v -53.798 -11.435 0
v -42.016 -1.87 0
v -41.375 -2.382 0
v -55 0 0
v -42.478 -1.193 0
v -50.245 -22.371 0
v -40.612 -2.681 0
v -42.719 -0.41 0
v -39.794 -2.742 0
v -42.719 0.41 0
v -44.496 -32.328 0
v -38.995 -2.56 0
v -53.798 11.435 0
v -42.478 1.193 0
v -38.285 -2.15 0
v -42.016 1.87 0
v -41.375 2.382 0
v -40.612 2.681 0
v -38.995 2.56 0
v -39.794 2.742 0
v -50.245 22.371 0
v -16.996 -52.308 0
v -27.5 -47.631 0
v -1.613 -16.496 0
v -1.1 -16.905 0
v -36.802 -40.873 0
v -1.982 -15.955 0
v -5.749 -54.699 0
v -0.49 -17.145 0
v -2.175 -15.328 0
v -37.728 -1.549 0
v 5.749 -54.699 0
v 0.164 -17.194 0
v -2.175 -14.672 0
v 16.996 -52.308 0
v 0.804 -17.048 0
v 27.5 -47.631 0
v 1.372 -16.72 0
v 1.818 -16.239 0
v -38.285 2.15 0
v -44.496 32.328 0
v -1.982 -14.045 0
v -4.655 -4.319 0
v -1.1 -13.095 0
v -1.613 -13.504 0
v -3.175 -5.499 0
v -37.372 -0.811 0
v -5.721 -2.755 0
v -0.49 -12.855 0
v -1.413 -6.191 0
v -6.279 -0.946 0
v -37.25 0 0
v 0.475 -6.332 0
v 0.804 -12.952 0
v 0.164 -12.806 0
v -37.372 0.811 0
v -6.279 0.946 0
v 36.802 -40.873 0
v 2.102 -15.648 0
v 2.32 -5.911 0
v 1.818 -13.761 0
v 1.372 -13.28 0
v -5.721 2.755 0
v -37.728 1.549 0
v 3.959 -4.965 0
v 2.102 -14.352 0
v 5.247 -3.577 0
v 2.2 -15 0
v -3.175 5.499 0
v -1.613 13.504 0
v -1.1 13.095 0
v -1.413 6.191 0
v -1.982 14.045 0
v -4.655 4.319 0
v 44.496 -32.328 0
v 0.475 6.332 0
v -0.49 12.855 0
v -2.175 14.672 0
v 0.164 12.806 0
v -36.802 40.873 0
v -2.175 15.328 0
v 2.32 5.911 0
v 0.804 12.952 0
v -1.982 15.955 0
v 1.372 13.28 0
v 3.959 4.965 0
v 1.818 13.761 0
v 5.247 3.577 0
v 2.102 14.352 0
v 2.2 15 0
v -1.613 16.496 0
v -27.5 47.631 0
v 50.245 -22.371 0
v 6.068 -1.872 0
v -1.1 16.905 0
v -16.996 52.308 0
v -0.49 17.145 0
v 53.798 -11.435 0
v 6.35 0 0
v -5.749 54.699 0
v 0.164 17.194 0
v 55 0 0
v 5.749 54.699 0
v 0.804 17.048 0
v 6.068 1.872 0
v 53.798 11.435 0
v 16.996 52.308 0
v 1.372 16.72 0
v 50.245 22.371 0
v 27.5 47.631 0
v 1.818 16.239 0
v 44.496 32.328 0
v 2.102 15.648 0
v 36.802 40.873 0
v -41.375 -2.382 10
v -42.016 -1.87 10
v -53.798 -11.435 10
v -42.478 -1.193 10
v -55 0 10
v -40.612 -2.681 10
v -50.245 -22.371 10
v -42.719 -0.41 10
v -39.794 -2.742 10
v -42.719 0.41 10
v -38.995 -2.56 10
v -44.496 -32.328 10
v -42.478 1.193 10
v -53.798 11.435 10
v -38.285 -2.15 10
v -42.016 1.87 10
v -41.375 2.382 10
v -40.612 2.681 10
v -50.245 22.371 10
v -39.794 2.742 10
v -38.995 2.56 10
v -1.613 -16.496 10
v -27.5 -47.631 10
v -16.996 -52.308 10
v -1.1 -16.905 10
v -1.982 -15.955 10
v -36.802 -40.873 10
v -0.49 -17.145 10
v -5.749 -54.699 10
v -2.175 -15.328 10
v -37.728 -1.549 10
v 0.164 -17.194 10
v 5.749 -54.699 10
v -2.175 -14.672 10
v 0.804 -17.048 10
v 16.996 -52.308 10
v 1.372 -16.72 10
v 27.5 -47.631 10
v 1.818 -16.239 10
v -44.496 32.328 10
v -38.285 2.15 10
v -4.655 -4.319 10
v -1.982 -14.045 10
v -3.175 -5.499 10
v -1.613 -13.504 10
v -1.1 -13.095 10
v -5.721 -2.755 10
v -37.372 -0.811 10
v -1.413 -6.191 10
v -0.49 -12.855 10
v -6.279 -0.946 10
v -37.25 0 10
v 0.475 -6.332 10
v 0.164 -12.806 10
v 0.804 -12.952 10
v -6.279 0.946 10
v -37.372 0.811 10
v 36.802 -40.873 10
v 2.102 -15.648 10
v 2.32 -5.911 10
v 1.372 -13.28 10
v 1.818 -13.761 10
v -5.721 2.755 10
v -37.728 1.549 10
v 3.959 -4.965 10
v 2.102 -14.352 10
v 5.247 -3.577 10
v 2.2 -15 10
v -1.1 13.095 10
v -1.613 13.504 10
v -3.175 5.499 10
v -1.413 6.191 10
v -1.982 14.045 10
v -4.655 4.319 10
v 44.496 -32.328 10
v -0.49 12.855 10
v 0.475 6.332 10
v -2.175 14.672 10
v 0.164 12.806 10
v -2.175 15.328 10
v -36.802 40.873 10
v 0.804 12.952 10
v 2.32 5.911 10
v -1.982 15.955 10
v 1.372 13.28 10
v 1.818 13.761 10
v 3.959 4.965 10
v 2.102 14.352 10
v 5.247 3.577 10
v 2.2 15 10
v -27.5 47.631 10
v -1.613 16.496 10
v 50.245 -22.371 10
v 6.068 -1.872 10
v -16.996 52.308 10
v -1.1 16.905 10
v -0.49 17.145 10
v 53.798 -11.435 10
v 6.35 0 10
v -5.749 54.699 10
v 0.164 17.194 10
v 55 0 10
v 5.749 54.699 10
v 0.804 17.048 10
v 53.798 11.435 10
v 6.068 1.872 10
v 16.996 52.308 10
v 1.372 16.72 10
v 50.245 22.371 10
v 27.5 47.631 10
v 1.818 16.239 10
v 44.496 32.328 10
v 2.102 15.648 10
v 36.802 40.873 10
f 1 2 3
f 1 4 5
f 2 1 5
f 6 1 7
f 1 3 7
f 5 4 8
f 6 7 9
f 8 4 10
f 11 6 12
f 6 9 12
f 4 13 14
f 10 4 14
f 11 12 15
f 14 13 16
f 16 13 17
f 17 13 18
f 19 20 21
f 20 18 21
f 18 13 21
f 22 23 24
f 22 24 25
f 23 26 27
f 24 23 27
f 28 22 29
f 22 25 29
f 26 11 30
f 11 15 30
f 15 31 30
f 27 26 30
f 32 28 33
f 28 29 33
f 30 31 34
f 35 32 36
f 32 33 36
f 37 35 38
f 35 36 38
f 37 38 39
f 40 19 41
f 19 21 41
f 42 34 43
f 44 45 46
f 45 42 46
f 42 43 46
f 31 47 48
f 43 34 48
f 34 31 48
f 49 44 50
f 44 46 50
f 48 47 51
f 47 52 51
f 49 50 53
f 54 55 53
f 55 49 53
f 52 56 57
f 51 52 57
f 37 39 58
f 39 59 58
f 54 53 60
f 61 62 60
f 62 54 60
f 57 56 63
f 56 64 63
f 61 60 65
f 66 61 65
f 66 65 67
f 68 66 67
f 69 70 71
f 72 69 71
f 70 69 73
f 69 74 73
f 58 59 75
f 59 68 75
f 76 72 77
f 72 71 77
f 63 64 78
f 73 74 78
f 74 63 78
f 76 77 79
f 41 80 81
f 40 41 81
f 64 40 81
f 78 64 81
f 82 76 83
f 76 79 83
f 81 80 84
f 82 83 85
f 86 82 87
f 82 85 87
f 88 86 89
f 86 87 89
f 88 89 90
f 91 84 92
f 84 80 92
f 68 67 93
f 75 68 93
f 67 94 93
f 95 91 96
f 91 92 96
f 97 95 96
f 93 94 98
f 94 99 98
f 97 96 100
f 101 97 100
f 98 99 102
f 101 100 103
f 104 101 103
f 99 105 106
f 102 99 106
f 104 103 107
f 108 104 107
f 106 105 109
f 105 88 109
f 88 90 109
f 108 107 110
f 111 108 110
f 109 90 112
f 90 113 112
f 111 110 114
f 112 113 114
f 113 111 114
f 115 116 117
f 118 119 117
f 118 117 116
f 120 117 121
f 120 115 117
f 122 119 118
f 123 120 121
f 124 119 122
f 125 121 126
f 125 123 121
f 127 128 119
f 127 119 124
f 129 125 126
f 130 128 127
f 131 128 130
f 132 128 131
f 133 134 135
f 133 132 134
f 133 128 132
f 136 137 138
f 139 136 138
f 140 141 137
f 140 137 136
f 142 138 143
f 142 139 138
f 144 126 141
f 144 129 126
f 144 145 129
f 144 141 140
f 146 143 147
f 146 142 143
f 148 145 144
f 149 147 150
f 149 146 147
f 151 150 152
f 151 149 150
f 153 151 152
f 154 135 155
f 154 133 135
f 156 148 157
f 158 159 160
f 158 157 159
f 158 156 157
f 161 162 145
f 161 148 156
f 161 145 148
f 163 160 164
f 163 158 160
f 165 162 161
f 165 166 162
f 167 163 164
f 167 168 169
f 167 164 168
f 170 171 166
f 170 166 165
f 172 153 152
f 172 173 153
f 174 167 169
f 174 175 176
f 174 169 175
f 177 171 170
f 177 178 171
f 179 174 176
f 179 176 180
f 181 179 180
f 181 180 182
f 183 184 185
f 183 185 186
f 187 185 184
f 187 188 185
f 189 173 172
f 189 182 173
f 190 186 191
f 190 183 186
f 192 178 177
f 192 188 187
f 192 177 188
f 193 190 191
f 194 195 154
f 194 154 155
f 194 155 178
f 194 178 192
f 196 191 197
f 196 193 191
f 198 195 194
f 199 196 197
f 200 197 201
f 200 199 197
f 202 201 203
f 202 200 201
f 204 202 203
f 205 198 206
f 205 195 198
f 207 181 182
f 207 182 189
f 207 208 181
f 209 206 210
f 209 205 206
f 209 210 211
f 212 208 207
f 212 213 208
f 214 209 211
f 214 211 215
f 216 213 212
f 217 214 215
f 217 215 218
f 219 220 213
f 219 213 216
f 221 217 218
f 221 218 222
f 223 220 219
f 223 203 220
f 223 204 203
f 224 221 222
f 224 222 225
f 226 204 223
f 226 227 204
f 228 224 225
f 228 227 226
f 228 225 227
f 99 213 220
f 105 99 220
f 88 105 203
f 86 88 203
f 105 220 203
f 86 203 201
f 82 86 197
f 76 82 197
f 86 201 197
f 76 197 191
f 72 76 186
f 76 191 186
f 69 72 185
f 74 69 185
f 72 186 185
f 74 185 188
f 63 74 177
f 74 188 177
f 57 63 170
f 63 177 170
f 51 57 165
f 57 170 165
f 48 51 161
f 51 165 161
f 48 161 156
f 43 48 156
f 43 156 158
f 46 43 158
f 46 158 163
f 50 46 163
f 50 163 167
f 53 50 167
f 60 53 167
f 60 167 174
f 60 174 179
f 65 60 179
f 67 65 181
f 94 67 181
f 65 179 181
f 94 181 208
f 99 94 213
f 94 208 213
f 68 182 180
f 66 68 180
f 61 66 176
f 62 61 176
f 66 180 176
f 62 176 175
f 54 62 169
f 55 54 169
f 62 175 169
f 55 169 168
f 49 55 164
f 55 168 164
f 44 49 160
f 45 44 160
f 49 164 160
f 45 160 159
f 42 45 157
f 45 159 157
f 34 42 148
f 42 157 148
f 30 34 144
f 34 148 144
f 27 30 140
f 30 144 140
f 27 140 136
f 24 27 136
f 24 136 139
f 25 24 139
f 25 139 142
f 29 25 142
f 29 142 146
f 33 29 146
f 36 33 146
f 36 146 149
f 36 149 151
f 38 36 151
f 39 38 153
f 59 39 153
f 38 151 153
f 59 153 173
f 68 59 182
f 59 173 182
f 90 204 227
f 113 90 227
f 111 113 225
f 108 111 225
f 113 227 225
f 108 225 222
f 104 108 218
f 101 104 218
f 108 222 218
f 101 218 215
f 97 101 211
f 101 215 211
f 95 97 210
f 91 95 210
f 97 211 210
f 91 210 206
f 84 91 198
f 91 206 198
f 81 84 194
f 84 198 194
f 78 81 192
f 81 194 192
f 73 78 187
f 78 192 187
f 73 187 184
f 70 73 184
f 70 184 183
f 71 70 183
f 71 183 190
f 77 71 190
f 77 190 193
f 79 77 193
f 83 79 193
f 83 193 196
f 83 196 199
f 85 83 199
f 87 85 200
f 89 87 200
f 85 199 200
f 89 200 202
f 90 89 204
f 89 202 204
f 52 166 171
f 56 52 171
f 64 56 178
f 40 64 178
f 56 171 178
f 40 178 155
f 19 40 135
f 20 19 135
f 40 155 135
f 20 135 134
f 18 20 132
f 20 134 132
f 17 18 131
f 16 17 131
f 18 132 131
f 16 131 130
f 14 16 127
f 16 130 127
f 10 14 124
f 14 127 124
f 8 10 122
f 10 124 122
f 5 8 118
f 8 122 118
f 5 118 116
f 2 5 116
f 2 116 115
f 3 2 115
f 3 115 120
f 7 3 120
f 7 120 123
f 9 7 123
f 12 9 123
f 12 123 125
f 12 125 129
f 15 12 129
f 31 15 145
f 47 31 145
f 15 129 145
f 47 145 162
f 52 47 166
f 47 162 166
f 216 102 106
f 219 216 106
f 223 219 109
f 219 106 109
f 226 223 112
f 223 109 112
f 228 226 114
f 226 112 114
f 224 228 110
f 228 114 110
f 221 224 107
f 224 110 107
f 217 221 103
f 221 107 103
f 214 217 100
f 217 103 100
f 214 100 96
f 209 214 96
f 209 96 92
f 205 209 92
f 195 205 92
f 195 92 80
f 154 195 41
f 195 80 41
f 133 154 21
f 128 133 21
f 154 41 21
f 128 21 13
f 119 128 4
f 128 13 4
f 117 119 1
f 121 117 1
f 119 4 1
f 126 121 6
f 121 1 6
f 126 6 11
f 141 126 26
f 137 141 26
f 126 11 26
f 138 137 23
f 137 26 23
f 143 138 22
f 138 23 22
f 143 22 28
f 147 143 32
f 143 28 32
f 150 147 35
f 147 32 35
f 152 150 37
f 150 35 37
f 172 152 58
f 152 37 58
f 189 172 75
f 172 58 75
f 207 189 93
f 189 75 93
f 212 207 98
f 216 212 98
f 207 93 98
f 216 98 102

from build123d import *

# Parameters (mm, degrees)
SKETCH1_R          = 55
EXTRUDE_3_8_DEPTH  = 10
SKETCH5_R          = 6.35
CUT_EXTRUDE2_DEPTH = 10
SKETCH6_R          = 2.2
M4_THROUGH2_DEPTH  = 10
SKETCH7_R          = 2.75
CUT_EXTRUDE4_DEPTH = 10


with BuildPart() as part:
    # Sketch1 → 3/8 (new body)
    with BuildSketch(Plane.XY):
        Circle(SKETCH1_R)
    extrude(amount=EXTRUDE_3_8_DEPTH)

    # Sketch5 → Cut-Extrude2 (cut)
    with BuildSketch(Plane.XY.offset(10)):
        Circle(SKETCH5_R)
    extrude(amount=-CUT_EXTRUDE2_DEPTH, mode=Mode.SUBTRACT)

    # Sketch6 → M4_through2 (cut)
    with BuildSketch(Plane.XY.offset(10)):
        with Locations((0, 15)):
            Circle(SKETCH6_R)
        with Locations((0, -15)):
            Circle(SKETCH6_R)
    extrude(amount=-M4_THROUGH2_DEPTH, mode=Mode.SUBTRACT)

    # Sketch7 → Cut-Extrude4 (cut)
    with BuildSketch(Plane.XY.offset(10)):
        with Locations((-40, 0)):
            Circle(SKETCH7_R)
    extrude(amount=-CUT_EXTRUDE4_DEPTH, mode=Mode.SUBTRACT)


solid = part.part
